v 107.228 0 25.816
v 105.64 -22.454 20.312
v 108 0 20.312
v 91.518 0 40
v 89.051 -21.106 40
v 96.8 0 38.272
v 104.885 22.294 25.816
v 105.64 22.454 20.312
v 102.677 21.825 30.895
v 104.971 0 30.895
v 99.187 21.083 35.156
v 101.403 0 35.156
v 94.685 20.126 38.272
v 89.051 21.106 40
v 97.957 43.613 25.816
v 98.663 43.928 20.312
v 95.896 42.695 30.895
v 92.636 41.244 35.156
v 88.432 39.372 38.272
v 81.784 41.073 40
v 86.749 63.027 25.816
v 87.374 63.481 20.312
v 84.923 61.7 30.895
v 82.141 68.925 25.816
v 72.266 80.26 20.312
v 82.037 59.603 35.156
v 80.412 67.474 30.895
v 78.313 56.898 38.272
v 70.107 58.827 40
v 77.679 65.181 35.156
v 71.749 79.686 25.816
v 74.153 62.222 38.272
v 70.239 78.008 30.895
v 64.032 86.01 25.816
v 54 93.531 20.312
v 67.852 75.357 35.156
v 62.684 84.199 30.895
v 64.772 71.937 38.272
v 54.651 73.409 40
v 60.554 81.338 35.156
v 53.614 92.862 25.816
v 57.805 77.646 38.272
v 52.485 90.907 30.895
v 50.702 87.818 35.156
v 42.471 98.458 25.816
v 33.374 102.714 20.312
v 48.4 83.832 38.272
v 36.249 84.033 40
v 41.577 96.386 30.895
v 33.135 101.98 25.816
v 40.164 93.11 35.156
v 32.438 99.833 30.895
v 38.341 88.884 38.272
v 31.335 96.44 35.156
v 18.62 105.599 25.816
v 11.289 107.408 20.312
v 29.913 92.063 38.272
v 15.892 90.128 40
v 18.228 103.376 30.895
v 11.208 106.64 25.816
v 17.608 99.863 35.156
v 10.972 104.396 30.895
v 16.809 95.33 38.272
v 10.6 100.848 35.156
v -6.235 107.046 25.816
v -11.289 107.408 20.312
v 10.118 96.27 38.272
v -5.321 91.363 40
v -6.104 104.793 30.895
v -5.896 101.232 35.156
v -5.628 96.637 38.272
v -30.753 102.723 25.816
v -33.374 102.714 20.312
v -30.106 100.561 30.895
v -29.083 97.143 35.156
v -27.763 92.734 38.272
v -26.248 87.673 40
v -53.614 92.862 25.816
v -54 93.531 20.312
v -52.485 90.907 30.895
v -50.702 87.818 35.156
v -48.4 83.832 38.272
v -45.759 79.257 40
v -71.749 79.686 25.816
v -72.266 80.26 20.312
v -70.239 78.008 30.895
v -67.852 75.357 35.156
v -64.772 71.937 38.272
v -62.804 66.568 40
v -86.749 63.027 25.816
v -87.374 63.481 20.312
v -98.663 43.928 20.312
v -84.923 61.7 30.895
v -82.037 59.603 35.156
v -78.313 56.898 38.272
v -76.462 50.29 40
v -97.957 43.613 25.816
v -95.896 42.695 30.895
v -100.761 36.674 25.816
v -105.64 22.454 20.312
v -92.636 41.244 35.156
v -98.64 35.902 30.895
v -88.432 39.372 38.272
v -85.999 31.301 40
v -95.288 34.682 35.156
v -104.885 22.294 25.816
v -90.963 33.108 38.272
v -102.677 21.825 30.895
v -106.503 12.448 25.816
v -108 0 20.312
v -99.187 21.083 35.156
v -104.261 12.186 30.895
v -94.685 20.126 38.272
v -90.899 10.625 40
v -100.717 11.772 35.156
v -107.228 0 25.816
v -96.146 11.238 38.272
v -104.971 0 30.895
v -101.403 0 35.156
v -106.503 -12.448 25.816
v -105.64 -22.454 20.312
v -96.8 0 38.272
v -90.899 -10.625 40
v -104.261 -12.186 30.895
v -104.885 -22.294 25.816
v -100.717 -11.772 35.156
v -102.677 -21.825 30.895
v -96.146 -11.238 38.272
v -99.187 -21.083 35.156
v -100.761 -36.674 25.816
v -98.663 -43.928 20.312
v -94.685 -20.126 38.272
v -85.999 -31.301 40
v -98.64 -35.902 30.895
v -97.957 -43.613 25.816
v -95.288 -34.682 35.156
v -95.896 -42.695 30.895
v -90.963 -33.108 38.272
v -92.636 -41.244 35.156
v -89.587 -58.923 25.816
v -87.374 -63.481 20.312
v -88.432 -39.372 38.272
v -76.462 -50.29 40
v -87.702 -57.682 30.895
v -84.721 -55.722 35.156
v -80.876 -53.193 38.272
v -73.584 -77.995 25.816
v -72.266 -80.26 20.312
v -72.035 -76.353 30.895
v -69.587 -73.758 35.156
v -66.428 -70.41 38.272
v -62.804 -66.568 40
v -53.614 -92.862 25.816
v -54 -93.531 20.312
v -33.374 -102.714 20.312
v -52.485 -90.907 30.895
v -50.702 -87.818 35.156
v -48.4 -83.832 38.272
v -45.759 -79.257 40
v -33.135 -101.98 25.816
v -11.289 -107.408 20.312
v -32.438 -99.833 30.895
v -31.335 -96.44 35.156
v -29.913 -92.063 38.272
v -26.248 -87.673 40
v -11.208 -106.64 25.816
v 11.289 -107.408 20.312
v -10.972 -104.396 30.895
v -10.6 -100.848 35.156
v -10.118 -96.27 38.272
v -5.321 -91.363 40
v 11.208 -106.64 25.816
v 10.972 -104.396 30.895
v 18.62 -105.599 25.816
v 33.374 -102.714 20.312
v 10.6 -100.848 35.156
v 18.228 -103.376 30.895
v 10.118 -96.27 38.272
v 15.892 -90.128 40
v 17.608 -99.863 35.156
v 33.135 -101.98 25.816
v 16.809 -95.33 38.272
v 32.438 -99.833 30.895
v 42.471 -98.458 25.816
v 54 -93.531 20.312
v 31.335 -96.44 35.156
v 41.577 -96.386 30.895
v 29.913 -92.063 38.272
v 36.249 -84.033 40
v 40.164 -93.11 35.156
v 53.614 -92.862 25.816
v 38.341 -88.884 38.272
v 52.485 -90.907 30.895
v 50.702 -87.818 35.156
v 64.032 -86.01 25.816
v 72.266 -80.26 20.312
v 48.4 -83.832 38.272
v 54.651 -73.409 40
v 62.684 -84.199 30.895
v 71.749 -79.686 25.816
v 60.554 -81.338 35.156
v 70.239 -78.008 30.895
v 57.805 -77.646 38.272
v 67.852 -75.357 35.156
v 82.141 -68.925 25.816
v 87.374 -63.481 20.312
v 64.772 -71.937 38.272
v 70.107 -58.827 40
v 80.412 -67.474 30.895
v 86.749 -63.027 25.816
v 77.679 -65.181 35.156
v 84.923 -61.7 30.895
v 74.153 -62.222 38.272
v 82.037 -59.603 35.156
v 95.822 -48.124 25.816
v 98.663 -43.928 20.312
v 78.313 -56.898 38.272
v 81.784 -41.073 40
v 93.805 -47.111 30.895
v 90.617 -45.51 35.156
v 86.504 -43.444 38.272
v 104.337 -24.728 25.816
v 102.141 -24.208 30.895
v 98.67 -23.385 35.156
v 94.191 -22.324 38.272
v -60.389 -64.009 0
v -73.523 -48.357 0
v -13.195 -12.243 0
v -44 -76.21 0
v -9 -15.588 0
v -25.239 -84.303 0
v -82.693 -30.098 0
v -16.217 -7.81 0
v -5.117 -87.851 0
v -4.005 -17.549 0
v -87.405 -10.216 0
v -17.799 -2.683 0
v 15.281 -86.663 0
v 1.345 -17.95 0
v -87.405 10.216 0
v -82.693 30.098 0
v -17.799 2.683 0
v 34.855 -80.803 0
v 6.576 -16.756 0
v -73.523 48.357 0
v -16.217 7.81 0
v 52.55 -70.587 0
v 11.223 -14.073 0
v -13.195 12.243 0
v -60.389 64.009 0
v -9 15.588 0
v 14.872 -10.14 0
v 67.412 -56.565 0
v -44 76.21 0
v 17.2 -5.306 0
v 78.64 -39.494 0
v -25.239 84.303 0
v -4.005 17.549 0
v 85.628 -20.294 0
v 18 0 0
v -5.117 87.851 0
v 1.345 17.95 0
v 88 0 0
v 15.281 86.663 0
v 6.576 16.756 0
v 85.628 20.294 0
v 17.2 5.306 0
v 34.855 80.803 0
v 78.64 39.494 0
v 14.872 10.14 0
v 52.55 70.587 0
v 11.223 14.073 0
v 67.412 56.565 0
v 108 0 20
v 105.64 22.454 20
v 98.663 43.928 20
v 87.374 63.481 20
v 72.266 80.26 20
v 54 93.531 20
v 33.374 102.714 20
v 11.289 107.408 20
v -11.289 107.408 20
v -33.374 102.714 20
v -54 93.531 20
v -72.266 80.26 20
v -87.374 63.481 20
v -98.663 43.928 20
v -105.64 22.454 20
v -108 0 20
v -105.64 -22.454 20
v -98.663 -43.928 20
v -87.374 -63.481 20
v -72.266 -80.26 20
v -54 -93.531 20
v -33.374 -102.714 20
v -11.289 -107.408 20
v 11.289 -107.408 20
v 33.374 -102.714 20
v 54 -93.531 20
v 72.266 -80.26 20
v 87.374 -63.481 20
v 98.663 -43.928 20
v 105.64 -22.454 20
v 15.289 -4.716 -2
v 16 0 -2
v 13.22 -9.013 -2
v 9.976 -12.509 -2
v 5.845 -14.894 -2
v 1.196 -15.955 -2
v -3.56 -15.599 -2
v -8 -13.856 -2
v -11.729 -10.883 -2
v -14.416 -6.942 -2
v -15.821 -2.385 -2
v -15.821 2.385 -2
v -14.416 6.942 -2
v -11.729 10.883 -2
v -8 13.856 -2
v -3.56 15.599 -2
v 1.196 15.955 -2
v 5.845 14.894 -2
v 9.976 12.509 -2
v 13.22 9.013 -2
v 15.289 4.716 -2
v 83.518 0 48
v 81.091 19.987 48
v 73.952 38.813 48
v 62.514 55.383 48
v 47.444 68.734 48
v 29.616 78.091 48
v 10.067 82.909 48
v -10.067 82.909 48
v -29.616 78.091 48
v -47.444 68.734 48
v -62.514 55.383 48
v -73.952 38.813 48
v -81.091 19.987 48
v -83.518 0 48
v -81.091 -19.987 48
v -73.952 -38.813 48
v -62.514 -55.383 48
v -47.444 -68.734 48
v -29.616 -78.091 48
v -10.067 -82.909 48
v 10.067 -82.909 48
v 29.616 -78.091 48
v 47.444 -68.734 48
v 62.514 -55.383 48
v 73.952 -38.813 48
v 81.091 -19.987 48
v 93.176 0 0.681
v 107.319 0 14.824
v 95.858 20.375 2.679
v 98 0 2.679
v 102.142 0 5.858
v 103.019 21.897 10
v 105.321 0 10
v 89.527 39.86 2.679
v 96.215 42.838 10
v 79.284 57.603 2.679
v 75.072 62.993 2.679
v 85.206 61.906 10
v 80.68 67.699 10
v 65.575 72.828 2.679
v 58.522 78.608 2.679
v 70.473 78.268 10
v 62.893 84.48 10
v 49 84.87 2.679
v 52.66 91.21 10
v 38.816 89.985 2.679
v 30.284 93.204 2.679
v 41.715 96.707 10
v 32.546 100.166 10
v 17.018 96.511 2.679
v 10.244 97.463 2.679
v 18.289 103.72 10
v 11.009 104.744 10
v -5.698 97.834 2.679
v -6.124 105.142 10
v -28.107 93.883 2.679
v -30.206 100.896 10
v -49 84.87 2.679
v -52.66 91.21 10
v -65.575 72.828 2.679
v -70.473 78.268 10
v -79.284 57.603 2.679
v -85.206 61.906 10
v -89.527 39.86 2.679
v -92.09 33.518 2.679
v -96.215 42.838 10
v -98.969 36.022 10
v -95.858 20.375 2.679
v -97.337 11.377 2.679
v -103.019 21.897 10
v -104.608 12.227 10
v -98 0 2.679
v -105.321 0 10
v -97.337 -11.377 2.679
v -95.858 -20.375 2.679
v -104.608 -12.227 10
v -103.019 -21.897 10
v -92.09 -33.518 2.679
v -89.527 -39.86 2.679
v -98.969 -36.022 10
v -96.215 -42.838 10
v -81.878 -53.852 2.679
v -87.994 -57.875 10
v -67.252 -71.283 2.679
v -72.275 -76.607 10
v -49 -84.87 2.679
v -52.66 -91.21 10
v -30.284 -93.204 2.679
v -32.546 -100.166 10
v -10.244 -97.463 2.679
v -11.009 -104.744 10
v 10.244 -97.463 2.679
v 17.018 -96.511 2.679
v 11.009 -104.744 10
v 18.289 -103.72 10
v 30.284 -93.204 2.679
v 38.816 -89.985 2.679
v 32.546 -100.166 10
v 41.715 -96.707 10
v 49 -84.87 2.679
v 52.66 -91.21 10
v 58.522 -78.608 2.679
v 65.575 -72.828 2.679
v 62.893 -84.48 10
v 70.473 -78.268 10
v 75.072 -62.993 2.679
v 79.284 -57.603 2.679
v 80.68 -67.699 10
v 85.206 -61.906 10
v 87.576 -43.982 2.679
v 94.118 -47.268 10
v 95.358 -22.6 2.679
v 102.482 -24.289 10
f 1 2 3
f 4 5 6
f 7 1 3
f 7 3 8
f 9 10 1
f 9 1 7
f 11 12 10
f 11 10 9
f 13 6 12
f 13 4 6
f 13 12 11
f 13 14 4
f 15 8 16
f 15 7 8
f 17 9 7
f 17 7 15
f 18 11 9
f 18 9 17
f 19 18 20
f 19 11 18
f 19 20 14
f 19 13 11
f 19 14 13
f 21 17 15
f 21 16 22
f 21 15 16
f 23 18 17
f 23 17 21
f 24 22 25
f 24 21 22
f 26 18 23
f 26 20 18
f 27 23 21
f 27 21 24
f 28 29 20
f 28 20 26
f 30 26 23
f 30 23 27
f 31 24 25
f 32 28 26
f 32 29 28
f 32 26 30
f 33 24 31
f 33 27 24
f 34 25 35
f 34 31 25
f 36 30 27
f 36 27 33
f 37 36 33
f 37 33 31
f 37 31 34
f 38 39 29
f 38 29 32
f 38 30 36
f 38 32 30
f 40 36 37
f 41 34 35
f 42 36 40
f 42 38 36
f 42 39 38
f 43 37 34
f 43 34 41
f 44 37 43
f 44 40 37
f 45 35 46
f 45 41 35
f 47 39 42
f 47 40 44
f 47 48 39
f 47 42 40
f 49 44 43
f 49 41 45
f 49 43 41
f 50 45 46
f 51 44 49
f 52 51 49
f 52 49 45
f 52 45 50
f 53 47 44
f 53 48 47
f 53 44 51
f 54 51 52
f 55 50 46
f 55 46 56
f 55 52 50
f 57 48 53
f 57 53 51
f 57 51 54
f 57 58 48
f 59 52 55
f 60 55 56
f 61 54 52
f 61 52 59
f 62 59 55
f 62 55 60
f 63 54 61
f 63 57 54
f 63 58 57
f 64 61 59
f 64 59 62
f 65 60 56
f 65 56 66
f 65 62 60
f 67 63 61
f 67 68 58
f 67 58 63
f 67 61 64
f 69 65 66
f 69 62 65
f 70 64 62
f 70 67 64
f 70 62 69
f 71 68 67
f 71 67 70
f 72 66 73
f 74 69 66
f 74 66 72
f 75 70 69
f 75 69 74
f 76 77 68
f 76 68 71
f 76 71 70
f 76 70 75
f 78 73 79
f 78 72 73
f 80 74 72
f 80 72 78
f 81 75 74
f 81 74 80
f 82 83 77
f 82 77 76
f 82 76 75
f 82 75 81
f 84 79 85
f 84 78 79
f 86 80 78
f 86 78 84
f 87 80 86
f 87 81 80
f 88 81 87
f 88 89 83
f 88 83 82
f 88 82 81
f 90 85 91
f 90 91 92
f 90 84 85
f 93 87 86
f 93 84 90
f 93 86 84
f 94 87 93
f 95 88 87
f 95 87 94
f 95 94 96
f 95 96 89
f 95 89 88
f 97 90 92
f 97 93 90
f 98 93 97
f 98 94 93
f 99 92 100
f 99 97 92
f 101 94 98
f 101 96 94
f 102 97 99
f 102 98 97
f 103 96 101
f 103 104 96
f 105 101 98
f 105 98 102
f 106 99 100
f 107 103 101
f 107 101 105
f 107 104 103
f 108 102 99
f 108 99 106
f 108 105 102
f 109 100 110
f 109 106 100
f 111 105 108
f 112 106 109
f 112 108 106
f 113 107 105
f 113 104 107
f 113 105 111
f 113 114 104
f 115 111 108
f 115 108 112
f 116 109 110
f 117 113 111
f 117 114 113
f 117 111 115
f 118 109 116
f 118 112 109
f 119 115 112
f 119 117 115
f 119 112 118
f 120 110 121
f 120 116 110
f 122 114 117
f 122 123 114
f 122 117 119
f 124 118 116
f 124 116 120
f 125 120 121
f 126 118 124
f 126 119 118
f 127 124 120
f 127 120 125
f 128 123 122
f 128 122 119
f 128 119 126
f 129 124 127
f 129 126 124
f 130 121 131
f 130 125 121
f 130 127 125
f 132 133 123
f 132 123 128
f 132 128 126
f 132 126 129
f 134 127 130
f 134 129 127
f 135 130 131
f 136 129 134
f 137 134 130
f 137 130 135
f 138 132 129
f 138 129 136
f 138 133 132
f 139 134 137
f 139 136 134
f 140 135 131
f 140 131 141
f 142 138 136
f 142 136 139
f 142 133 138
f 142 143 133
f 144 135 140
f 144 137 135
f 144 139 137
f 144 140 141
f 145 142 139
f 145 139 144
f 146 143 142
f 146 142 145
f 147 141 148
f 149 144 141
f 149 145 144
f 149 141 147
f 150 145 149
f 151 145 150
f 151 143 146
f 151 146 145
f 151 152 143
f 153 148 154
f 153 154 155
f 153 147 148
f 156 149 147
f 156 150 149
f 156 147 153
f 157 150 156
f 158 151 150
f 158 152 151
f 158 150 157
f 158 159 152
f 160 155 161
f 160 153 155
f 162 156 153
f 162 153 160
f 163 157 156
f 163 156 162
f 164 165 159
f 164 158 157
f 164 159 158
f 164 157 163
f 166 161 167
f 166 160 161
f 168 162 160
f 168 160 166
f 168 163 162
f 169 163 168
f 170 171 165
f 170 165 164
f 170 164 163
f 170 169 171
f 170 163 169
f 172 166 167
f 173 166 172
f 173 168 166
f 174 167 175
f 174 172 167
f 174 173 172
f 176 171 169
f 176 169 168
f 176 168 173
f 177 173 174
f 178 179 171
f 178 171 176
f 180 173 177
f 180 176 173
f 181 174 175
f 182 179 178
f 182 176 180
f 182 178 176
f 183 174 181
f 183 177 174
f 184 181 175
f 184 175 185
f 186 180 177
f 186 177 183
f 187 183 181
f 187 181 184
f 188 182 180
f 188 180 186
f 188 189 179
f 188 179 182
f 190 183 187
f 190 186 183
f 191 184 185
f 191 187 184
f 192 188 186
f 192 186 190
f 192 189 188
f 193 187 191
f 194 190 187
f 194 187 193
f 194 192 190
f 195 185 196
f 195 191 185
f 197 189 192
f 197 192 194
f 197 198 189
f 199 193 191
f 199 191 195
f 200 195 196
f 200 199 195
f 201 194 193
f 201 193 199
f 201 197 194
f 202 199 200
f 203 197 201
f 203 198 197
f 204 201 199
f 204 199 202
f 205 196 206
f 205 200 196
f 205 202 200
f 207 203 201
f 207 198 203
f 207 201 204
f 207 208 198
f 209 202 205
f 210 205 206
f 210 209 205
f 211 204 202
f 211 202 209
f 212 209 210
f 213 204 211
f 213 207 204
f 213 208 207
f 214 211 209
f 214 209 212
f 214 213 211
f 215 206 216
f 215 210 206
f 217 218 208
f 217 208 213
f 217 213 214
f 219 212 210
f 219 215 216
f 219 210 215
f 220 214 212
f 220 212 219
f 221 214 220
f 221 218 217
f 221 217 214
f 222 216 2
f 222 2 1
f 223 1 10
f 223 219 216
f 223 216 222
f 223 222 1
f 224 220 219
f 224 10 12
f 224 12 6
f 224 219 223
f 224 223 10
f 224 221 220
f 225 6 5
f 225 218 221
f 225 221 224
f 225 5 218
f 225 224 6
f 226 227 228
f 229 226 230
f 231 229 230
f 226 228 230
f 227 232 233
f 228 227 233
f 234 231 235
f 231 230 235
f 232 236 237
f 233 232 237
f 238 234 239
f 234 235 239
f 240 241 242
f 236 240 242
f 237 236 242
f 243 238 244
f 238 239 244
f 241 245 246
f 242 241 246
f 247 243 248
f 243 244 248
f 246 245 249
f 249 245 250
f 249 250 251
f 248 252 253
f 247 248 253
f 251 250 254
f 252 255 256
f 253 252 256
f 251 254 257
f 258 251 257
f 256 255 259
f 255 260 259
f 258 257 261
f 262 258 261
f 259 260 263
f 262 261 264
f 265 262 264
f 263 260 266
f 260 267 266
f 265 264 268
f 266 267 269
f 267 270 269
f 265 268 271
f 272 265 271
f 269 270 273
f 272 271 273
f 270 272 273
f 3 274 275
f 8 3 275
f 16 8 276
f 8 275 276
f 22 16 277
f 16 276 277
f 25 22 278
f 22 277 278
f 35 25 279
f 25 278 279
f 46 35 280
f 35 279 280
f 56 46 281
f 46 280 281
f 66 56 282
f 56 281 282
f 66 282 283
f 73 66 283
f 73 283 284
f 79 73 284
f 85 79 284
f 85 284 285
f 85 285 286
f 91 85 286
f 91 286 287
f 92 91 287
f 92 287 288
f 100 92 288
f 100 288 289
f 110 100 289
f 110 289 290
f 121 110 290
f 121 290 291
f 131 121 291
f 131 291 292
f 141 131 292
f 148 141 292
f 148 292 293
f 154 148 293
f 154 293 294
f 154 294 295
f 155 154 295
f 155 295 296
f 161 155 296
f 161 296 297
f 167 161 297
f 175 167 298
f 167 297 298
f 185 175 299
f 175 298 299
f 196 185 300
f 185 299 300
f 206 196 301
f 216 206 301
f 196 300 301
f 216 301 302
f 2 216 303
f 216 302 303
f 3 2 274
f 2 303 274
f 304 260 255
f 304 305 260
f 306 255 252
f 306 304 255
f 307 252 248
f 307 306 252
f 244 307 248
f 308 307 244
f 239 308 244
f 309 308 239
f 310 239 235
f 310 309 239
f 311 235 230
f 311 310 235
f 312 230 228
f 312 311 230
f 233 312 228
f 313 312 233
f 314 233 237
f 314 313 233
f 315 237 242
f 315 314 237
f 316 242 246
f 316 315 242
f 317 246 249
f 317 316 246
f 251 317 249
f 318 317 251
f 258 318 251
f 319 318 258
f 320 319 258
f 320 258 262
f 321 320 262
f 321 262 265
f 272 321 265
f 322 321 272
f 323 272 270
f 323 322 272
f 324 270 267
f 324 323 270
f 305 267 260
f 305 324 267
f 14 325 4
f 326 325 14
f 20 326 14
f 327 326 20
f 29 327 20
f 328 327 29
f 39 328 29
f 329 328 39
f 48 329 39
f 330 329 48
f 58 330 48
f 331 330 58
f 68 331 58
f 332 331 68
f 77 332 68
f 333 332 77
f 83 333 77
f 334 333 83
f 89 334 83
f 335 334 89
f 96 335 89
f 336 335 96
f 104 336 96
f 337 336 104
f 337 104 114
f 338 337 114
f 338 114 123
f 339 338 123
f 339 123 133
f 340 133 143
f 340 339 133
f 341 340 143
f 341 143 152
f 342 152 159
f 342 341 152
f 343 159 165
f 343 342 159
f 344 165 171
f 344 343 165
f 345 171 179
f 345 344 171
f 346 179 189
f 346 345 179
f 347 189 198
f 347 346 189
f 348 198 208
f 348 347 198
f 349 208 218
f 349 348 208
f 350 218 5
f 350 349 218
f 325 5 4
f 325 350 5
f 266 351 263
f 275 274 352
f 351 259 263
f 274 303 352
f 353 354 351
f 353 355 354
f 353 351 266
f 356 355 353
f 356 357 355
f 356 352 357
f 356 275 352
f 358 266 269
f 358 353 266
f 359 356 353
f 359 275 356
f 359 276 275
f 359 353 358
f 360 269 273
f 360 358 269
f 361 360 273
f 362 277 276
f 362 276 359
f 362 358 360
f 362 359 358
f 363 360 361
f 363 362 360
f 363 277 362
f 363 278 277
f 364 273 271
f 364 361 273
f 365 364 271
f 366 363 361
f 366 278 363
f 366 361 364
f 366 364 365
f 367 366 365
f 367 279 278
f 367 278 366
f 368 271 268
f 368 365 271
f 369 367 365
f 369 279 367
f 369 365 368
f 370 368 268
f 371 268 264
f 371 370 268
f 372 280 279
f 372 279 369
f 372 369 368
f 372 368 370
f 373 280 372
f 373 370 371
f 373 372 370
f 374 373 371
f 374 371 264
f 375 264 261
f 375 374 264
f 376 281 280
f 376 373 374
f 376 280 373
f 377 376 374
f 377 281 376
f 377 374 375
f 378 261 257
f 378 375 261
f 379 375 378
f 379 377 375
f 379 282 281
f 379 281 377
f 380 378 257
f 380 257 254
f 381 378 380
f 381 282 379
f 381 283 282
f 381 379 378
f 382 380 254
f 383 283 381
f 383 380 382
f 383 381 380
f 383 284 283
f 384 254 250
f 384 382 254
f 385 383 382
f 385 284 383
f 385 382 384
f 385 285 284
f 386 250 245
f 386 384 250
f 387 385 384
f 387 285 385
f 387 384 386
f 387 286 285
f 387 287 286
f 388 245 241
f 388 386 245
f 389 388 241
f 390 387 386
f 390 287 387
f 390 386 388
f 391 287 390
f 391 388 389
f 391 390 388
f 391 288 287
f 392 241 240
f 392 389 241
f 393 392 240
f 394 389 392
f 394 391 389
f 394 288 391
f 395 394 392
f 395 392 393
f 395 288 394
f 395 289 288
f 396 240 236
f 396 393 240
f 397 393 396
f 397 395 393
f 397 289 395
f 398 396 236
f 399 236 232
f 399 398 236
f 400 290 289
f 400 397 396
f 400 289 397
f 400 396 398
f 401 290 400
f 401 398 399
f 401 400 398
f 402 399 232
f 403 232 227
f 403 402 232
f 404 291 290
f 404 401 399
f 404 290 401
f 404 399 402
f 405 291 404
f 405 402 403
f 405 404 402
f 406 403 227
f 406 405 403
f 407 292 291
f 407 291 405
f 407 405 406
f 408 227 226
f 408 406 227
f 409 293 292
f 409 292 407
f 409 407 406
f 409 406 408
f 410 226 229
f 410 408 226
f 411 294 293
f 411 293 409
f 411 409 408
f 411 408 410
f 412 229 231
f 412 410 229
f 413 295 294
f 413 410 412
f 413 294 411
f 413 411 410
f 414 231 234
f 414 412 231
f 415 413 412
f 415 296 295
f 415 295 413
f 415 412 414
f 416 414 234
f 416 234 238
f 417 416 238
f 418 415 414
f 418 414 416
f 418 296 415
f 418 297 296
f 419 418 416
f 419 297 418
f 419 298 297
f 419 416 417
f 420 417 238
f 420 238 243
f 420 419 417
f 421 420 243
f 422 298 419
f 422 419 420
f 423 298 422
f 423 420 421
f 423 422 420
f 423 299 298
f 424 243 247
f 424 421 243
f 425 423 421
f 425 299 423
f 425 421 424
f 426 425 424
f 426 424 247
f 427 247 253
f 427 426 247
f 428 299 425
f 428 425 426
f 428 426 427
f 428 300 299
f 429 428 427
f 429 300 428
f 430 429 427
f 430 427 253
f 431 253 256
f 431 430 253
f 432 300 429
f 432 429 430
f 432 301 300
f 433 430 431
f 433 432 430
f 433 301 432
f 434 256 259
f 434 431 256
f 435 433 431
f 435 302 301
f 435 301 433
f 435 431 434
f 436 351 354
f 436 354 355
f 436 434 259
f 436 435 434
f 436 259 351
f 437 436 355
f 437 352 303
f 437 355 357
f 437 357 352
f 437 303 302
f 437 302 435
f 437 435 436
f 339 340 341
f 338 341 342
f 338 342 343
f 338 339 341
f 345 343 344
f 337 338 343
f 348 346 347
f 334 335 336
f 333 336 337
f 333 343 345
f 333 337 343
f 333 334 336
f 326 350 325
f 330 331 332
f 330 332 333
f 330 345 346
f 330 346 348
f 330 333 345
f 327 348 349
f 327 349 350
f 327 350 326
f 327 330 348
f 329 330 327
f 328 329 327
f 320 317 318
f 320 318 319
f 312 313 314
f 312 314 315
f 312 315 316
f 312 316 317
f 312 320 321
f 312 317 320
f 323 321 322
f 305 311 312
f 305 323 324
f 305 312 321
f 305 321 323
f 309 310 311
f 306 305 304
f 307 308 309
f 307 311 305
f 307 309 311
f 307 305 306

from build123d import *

# Parameters (mm, degrees)
SKETCH1_R           = 108
BOSS_EXTRUDE1_DEPTH = 40
SKETCH3_R           = 91.518206512
BOSS_EXTRUDE3_DEPTH = 8
CHAMFER1_SIZE       = 8
FILLET2_R           = 20
SKETCH5_R           = 20
BOSS_EXTRUDE4_DEPTH = 2
CHAMFER2_SIZE       = 4


# Some blends are built 0.0001 mm under size
with BuildPart() as part:
    # Sketch1 → Boss-Extrude1 (new body)
    with BuildSketch(Plane.XY):
        Circle(SKETCH1_R)
    extrude(amount=BOSS_EXTRUDE1_DEPTH)

    # Sketch3 → Boss-Extrude3 (add)
    with BuildSketch(Plane.XY.offset(40)):
        Circle(SKETCH3_R)
    extrude(amount=BOSS_EXTRUDE3_DEPTH)

    # Chamfer1
    chamfer1_edges = [part.edges().sort_by_distance(p)[0] for p in [
        (-91.518206512, 0, 48),
    ]]
    chamfer(chamfer1_edges, length=CHAMFER1_SIZE - 0.0001)  # a hair under: the kernel refuses the full size

    # Fillet2
    # the kernel refuses this fillet: 20 mm, written as the material it takes off along each edge
    with BuildSketch(Plane(origin=(0, 0, 0), x_dir=(1, 0, 0), z_dir=(0, -1, 0))) as fillet2_piece_1:
        with BuildLine():
            CenterArc((108 - FILLET2_R, FILLET2_R), FILLET2_R, 270, 90)
            Line((108 - FILLET2_R, 0), (108 - FILLET2_R, -FILLET2_R * 0.02))
            Line((108 - FILLET2_R, -FILLET2_R * 0.02), (108 + FILLET2_R * 0.02, -FILLET2_R * 0.02))
            Line((108 + FILLET2_R * 0.02, -FILLET2_R * 0.02), (108 + FILLET2_R * 0.02, FILLET2_R))
            Line((108 + FILLET2_R * 0.02, FILLET2_R), (108, FILLET2_R))
        make_face()
    revolve(axis=Axis((0, 0, 0), (0, 0, 1)), mode=Mode.SUBTRACT)
    with BuildSketch(Plane(origin=(0, 0, 40), x_dir=(1, 0, 0), z_dir=(0, -1, 0))) as fillet2_piece_2:
        with BuildLine():
            CenterArc((88, -19.688123906), FILLET2_R, 0, 79.868362225)
            Line((108, -19.688123906), (108.4, -19.688123906))
            Line((108.4, -19.688123906), (108.4, 0))
            Line((108.4, 0), (108, 0.4))
            ThreePointArc((108, 0.4), (99.759103256, 0.4), (91.588570642, 0.393762478))
            Line((91.588570642, 0.393762478), (91.518206512, 0))
        make_face()
    revolve(axis=Axis((0, 0, 40), (0, 0, 1)), mode=Mode.SUBTRACT)

    # Sketch5 → Boss-Extrude4 (add)
    with BuildSketch(Plane(origin=(0, 0, 0), x_dir=(-1, 0, 0), z_dir=(0, 0, -1))):
        with Locations(Location((0, 0, 0), (0, 0, 180))):
            Circle(SKETCH5_R)
    extrude(amount=BOSS_EXTRUDE4_DEPTH)

    # Chamfer2
    # the kernel refuses this chamfer: 4 mm, written as the material it takes off along each edge
    with BuildSketch(Plane(origin=(0, 0, -2), x_dir=(1, 0, 0), z_dir=(0, 1, 0))) as chamfer2_piece_1_section:
        Polygon((20, -CHAMFER2_SIZE), (20 - CHAMFER2_SIZE, 0), (20, 0), align=None)
    chamfer2_piece_1 = revolve(axis=Axis((0, 0, -2), (0, 0, -1)), mode=Mode.PRIVATE)
    chamfer2_piece_1 = split(chamfer2_piece_1, bisect_by=Plane(origin=(-17.007894049, 0, 0), z_dir=(0, 0, -1)), keep=Keep.TOP, mode=Mode.PRIVATE)
    add(chamfer2_piece_1, mode=Mode.SUBTRACT)


solid = part.part
